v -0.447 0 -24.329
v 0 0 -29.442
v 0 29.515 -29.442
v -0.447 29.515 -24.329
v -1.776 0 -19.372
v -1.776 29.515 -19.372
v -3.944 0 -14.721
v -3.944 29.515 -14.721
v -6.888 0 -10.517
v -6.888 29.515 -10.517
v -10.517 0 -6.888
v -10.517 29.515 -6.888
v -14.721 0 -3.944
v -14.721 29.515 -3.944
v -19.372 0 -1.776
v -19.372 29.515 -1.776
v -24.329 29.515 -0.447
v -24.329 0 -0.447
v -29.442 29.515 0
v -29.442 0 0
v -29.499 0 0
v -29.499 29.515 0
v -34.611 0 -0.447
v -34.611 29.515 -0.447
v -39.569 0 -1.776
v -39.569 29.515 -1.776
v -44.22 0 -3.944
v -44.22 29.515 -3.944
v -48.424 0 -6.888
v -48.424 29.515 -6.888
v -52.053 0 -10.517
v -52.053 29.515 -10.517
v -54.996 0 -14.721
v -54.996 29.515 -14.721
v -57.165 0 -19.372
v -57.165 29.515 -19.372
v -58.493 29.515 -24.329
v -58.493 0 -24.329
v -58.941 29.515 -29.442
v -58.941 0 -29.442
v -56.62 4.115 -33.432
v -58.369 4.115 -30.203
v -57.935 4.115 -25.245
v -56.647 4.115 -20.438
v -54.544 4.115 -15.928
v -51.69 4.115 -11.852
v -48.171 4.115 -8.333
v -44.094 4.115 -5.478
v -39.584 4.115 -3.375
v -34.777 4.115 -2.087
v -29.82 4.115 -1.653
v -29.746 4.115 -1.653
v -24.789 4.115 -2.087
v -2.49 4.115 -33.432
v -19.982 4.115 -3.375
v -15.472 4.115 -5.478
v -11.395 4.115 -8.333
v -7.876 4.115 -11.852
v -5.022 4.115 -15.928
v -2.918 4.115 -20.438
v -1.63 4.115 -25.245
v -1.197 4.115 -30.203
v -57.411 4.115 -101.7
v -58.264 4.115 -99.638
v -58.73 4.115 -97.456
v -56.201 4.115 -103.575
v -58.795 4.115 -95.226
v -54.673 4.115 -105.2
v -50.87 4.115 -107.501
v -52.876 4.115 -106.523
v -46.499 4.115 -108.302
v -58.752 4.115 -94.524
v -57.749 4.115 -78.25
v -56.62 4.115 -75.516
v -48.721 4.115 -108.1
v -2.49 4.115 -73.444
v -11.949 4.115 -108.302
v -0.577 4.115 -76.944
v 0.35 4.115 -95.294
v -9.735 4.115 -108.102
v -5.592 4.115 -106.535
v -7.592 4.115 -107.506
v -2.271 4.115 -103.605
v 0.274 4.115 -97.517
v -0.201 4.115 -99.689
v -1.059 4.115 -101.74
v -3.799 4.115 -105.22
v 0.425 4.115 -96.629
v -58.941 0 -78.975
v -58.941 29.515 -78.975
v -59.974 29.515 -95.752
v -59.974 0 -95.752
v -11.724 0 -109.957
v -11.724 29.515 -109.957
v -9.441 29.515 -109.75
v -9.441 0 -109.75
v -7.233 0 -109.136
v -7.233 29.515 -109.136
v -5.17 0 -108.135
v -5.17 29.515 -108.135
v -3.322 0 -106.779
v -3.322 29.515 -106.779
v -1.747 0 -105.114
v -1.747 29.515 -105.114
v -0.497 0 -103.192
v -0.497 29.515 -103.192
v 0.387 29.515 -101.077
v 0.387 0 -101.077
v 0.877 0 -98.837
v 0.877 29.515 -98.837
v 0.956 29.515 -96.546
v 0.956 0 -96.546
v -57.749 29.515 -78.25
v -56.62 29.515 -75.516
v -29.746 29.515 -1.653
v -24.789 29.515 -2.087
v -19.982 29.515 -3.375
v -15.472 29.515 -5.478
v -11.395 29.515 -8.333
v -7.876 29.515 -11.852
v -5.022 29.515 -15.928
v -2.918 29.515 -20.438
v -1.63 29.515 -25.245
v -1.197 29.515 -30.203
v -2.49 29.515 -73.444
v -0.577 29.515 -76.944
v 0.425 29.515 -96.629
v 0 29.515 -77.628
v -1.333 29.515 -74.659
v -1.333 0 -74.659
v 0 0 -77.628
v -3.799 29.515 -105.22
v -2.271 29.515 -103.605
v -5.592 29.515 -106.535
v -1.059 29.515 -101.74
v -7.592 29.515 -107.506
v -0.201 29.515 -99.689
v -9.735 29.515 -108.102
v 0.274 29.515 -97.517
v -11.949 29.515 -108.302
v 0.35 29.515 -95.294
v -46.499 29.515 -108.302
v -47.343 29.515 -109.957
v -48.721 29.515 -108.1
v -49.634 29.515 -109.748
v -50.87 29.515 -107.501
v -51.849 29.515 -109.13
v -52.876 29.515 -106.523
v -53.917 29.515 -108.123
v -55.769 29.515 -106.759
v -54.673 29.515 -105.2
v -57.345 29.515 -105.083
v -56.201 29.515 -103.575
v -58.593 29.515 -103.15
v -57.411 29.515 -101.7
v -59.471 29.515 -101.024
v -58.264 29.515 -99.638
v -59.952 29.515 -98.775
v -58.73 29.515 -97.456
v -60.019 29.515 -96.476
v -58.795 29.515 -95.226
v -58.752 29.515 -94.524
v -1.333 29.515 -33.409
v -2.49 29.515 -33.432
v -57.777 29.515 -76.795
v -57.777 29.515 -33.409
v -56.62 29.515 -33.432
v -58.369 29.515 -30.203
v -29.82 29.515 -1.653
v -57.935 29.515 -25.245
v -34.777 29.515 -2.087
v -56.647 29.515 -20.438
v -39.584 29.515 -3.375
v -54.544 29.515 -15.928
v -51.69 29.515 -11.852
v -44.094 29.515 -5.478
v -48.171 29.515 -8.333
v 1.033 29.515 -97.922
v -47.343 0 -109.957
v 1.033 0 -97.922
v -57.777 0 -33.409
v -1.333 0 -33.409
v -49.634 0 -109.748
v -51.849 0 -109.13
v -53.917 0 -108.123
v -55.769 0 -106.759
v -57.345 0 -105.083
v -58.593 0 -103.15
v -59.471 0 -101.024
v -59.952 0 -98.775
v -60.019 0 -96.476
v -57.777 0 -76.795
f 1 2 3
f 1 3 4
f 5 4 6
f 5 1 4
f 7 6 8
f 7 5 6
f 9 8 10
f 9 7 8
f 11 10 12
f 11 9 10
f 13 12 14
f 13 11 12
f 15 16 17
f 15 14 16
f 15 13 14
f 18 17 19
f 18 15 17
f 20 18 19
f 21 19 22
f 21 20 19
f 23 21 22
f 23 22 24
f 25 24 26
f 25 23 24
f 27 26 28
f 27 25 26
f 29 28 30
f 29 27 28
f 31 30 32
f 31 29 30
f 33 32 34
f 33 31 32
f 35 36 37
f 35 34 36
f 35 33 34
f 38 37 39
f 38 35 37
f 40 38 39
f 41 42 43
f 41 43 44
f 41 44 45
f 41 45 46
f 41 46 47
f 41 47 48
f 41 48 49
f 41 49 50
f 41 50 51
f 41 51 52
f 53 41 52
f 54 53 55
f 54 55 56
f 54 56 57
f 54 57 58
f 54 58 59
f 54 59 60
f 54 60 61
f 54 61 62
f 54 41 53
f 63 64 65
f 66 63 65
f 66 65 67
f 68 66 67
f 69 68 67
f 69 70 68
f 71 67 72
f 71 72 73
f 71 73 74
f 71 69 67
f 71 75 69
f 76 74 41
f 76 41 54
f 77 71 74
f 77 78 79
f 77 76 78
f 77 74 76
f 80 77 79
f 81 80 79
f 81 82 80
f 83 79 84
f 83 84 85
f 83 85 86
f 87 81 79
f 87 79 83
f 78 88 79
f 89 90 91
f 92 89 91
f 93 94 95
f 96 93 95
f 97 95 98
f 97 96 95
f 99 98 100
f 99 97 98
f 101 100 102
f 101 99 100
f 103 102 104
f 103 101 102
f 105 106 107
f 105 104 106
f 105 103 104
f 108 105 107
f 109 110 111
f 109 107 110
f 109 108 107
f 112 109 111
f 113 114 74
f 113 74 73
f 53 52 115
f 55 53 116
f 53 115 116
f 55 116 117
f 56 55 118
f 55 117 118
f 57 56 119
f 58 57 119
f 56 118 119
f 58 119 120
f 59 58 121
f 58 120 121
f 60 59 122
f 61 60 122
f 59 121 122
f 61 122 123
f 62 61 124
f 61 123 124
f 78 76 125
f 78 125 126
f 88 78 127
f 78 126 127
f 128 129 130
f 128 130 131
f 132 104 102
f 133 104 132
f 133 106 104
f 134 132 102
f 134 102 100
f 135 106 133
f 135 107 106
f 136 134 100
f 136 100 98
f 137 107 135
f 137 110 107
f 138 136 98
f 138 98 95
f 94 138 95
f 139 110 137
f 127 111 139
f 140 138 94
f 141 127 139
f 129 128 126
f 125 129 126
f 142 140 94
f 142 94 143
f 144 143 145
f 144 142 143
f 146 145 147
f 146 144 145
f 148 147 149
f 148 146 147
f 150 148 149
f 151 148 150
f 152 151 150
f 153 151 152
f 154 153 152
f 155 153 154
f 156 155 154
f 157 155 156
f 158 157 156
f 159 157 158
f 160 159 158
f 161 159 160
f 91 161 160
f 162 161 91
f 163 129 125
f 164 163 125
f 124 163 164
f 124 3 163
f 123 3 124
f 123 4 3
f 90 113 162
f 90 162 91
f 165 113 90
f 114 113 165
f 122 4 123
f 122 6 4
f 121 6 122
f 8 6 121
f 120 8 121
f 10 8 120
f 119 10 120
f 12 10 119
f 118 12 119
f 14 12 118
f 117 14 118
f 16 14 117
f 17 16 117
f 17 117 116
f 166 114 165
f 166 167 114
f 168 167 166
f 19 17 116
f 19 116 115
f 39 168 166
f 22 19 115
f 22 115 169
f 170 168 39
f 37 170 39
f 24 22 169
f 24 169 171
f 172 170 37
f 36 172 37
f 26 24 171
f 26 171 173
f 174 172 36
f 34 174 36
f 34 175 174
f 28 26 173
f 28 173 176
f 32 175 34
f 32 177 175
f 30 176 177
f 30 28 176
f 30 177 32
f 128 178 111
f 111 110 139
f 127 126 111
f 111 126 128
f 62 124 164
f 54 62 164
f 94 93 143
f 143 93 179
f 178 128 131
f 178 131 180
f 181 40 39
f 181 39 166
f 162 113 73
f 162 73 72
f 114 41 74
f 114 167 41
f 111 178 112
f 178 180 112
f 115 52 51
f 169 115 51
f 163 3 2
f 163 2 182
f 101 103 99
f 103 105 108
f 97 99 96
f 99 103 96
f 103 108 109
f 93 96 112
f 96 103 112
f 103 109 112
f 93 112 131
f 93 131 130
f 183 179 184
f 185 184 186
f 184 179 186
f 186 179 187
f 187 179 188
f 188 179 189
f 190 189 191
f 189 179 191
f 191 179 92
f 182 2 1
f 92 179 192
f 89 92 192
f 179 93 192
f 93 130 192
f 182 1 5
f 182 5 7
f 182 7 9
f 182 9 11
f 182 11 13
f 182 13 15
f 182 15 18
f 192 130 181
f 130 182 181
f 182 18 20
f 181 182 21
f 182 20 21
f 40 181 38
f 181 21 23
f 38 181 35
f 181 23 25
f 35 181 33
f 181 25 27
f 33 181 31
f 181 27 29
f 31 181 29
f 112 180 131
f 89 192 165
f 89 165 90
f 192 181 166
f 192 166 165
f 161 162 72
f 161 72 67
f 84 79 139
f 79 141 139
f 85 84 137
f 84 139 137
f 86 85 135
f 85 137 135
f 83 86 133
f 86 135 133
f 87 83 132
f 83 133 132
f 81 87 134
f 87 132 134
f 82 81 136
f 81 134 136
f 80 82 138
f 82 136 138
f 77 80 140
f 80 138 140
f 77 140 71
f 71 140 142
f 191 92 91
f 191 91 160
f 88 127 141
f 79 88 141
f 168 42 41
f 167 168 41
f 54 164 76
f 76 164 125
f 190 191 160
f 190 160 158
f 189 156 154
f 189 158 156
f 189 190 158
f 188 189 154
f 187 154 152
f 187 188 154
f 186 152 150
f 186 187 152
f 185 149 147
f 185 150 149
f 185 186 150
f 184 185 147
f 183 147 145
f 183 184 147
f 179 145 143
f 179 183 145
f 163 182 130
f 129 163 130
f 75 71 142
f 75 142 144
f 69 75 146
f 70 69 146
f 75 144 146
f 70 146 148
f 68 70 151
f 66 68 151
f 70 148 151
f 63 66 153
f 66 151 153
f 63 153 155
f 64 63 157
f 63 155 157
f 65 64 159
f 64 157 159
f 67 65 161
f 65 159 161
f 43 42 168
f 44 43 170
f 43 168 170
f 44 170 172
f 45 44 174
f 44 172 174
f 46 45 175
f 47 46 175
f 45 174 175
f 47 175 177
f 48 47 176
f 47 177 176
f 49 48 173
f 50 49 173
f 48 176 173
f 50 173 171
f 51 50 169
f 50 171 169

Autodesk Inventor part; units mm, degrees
ref_plane "YZ Plane" through (0, 0, 0) normal (1, 0, 0) x (0, 1, 0)
sketch "Sketch1" plane through (0, 0, 0) normal (0, 0, 1) x (1, 0, 0)
  point P0 (0, 0)
sketch "Sketch2" plane through (0, 0, 0) normal (0, 1, 0) x (-1, 0, 0)
  line L0 (29.4419, 0) -> (29.4988, 0)
  arc A0 (58.9407, -29.4419) -> (29.4988, 0) centre (29.4988, -29.4419) ccw
  arc A1 (29.4419, 0) -> (0, -29.4419) centre (29.4419, -29.4419) ccw
  line L1 (0, -29.4419) -> (1.3334, -33.4091)
  line L2 (1.3334, -33.4091) -> (1.3334, -74.6587)
  line L3 (1.3334, -74.6587) -> (0, -77.6285)
  line L4 (0, -77.6285) -> (-1.0327, -97.9222)
  line L5 (58.9407, -29.4419) -> (57.7766, -33.4091)
  line L6 (57.7766, -33.4091) -> (57.7766, -76.7951)
  line L7 (57.7766, -76.7951) -> (58.9407, -78.9752)
  line L8 (58.9407, -78.9752) -> (59.9743, -95.7523)
  line L9 (59.9743, -95.7523) -> (60.0189, -96.4757)
  line L10 (-1.0327, -97.9222) -> (-0.9556, -96.5463)
  line L11 (11.7245, -109.9566) -> (47.3429, -109.9566)
  arc A2 (47.3429, -109.9566) -> (60.0189, -96.4757) centre (47.3429, -97.2566) ccw
  arc A3 (-0.9556, -96.5463) -> (11.7245, -109.9566) centre (11.7245, -97.2566) ccw
  point P0 (0, 0)
  point P1 (58.9407, 0)
  dimension "d5" = 29.4419
  dimension "d6" = 41.2496
  dimension "d7" = 20.32
  dimension "d8" = 12.7
extrude "Extrusion1" add sketch "Sketch2" along normal blind 29.5148
sketch "Sketch3" plane through (0, 29.5148, 0) normal (0, 1, 0) x (1, 0, 0)
  line L0 (-29.7463, 1.6533) -> (-29.8195, 1.6533)
  arc A0 (-58.3691, 30.2029) -> (-29.8195, 1.6533) centre (-29.8195, 30.2029) ccw
  arc A1 (-29.7463, 1.6533) -> (-1.1967, 30.2029) centre (-29.7463, 30.2029) ccw
  line L1 (-1.1967, 30.2029) -> (-2.4901, 33.4321)
  line L2 (-2.4901, 33.4321) -> (-2.4901, 73.4442)
  line L3 (-2.4901, 73.4442) -> (-0.5766, 76.9439)
  line L4 (-0.5766, 76.9439) -> (0.4251, 96.6289)
  line L5 (-58.3691, 30.2029) -> (-56.62, 33.4321)
  line L6 (-56.62, 33.4321) -> (-56.62, 75.5165)
  line L7 (-56.62, 75.5165) -> (-57.7491, 78.2503)
  line L8 (-57.7491, 78.2503) -> (-58.7517, 94.5241)
  line L9 (-58.7517, 94.5241) -> (-58.7949, 95.2257)
  line L10 (0.4251, 96.6289) -> (0.3503, 95.2942)
  line L11 (-11.9494, 108.3022) -> (-46.4992, 108.3022)
  arc A2 (-46.4992, 108.3022) -> (-58.7949, 95.2257) centre (-46.4992, 95.9832) ccw
  arc A3 (0.3503, 95.2942) -> (-11.9494, 108.3022) centre (-11.9494, 95.9832) ccw
  line L12 (-2.4901, 52.1447) -> (-2.4901, 53.4382) construction
  line L13 (-57.7766, 76.7951) -> (-57.7766, 33.4091) construction
  line L14 (-57.7766, 54.1324) -> (-56.62, 54.1324) construction
  arc A4 (-58.9407, 29.4419) -> (-29.4988, 0) centre (-29.4988, 29.4419) ccw construction
  line L15 (-29.4988, 0) -> (-29.4988, 1.6544) construction
  line L16 (-28.1015, 108.3022) -> (-28.1015, 109.9566) construction
  line L17 (-11.7245, 109.9566) -> (-47.3429, 109.9566) construction
  line L18 (-2.4901, 53.4382) -> (-1.3334, 53.4382) construction
  line L19 (-1.3334, 33.4091) -> (-1.3334, 74.6587) construction
  point P0 (0, 0)
  point P1 (-1.2057, 1.6533)
  point P2 (-58.3782, 1.6533)
  dimension "d9" = 28.5496
  dimension "d10" = 40.0121
  dimension "d11" = 19.7104
  dimension "d12" = 12.319
extrude "Extrusion2" cut sketch "Sketch3" against normal blind 25.4
sketch "Sketch4" plane through (0, 29.5148, 0) normal (0, 1, 0) x (1, 0, 0)
  point P0 (0, 0)
sketch "Sketch5" plane through (-11.7245, 0, -109.9566) normal (0, 0, -1) x (-1, 0, 0)
  line L0 (35.6184, 26.9603) -> (35.6184, 25.922)
  line L1 (35.6184, 0) -> (35.6184, 29.5148) projected
  line L2 (0, 0) -> (0, 29.5148) projected
  point P0 (-11.7245, 0)
sketch "Sketch6" plane through (0, 29.5148, 0) normal (0, 1, 0) x (1, 0, 0)
  point P0 (0, 0)
ref_plane "Work Plane3" through (-47.3429, 25.922, -109.9566) normal (0, 1, 0) x (1, 0, 0)
sketch "Sketch7" plane through (-47.3429, 25.922, -109.9566) normal (0, 1, 0) x (1, 0, 0)
  line L0 (46.0094, -76.5475) -> (46.0094, -35.2979)
  line L1 (46.0094, -35.2979) -> (47.3429, -32.3281)
  line L2 (47.3429, -32.3281) -> (48.2985, -13.4103)
  line L3 (48.2985, -13.4103) -> (48.3756, -12.0344)
  line L4 (46.0094, -76.5475) -> (47.3429, -80.5147)
  line L5 (0, 0) -> (35.6184, 0)
  line L6 (-12.676, -13.4809) -> (-11.5978, -30.9814)
  line L7 (-11.5978, -30.9814) -> (-10.4337, -33.1615)
  line L8 (-10.4337, -33.1615) -> (-10.4337, -76.5475)
  line L9 (-10.4337, -76.5475) -> (-11.5978, -80.5147)
  arc A0 (-11.5978, -80.5147) -> (47.3429, -80.5147) centre (17.8725, -80.5147) ccw
  arc A1 (48.3756, -12.0344) -> (35.6184, 0) centre (35.6184, -12.7789) ccw
  line L10 (-12.676, -13.4809) -> (-11.5978, -30.9814) projected
  arc A2 (0, 0) -> (-12.676, -13.4809) centre (0, -12.7) ccw
  line L11 (46.0094, -76.5475) -> (46.0094, -35.2979)
  line L12 (46.0094, -35.2979) -> (47.3429, -32.3281)
  line L13 (47.3429, -32.3281) -> (48.2985, -13.4103)
  line L14 (48.2985, -13.4103) -> (48.3756, -12.0344)
  line L15 (46.0094, -76.5475) -> (47.3429, -80.5147)
  line L16 (0, 0) -> (35.6184, 0)
  line L17 (-12.676, -13.4809) -> (-11.5978, -30.9814)
  line L18 (-11.5978, -30.9814) -> (-10.4337, -33.1615)
  line L19 (-10.4337, -33.1615) -> (-10.4337, -76.5475)
  line L20 (-10.4337, -76.5475) -> (-11.5978, -80.5147)
  arc A3 (-11.5978, -80.5147) -> (47.3429, -80.5147) centre (17.8725, -80.5147) ccw
  arc A4 (48.3756, -12.0344) -> (35.6184, 0) centre (35.6184, -12.7789) ccw
  arc A5 (0, 0) -> (-12.676, -13.4809) centre (0, -12.7) ccw
  point P0 (47.3429, -109.9566)
sketch "Sketch8" plane through (-11.7245, 0, -109.9566) normal (0, 0, -1) x (-1, 0, 0)
  line L0 (0, 0) -> (0, 29.5148) projected
  line L1 (0, 25.1265) -> (35.5035, 25.1265)
  point P0 (-11.7245, 0)
ref_plane "Work Plane4" through (-11.7245, 25.1265, -109.9566) normal (0, -1, 0) x (-1, 0, 0)
sketch "Sketch9" plane through (-11.7245, 25.1265, -109.9566) normal (0, -1, 0) x (-1, 0, 0)
  line L0 (0, 0) -> (35.6184, 0)
  line L1 (46.0521, -76.5475) -> (47.2162, -80.5147)
  line L2 (48.2944, -13.4809) -> (47.2162, -31.0011)
  line L3 (47.2162, -31.0011) -> (46.0521, -33.1615)
  line L4 (46.0521, -33.1615) -> (46.0521, -76.5475)
  line L5 (-12.6801, -13.4103) -> (-12.7572, -12.0344)
  line L6 (-12.6801, -13.4103) -> (-11.7245, -32.3281)
  line L7 (-11.7245, -32.3281) -> (-10.3911, -35.2979)
  line L8 (-10.3911, -35.2979) -> (-10.3911, -76.5475)
  line L9 (-10.3911, -76.5475) -> (-11.7245, -80.5147)
  arc A0 (-11.7245, -80.5147) -> (47.2162, -80.5147) centre (17.7459, -80.4862) ccw
  arc A1 (0, 0) -> (-12.7572, -12.0344) centre (0, -12.7789) ccw
  arc A2 (48.2944, -13.4809) -> (35.6184, 0) centre (35.6184, -12.7) ccw
  point P0 (-11.7245, -109.9566)
  point P1 (17.7174, -109.9566)
properties part number "Random Object"
